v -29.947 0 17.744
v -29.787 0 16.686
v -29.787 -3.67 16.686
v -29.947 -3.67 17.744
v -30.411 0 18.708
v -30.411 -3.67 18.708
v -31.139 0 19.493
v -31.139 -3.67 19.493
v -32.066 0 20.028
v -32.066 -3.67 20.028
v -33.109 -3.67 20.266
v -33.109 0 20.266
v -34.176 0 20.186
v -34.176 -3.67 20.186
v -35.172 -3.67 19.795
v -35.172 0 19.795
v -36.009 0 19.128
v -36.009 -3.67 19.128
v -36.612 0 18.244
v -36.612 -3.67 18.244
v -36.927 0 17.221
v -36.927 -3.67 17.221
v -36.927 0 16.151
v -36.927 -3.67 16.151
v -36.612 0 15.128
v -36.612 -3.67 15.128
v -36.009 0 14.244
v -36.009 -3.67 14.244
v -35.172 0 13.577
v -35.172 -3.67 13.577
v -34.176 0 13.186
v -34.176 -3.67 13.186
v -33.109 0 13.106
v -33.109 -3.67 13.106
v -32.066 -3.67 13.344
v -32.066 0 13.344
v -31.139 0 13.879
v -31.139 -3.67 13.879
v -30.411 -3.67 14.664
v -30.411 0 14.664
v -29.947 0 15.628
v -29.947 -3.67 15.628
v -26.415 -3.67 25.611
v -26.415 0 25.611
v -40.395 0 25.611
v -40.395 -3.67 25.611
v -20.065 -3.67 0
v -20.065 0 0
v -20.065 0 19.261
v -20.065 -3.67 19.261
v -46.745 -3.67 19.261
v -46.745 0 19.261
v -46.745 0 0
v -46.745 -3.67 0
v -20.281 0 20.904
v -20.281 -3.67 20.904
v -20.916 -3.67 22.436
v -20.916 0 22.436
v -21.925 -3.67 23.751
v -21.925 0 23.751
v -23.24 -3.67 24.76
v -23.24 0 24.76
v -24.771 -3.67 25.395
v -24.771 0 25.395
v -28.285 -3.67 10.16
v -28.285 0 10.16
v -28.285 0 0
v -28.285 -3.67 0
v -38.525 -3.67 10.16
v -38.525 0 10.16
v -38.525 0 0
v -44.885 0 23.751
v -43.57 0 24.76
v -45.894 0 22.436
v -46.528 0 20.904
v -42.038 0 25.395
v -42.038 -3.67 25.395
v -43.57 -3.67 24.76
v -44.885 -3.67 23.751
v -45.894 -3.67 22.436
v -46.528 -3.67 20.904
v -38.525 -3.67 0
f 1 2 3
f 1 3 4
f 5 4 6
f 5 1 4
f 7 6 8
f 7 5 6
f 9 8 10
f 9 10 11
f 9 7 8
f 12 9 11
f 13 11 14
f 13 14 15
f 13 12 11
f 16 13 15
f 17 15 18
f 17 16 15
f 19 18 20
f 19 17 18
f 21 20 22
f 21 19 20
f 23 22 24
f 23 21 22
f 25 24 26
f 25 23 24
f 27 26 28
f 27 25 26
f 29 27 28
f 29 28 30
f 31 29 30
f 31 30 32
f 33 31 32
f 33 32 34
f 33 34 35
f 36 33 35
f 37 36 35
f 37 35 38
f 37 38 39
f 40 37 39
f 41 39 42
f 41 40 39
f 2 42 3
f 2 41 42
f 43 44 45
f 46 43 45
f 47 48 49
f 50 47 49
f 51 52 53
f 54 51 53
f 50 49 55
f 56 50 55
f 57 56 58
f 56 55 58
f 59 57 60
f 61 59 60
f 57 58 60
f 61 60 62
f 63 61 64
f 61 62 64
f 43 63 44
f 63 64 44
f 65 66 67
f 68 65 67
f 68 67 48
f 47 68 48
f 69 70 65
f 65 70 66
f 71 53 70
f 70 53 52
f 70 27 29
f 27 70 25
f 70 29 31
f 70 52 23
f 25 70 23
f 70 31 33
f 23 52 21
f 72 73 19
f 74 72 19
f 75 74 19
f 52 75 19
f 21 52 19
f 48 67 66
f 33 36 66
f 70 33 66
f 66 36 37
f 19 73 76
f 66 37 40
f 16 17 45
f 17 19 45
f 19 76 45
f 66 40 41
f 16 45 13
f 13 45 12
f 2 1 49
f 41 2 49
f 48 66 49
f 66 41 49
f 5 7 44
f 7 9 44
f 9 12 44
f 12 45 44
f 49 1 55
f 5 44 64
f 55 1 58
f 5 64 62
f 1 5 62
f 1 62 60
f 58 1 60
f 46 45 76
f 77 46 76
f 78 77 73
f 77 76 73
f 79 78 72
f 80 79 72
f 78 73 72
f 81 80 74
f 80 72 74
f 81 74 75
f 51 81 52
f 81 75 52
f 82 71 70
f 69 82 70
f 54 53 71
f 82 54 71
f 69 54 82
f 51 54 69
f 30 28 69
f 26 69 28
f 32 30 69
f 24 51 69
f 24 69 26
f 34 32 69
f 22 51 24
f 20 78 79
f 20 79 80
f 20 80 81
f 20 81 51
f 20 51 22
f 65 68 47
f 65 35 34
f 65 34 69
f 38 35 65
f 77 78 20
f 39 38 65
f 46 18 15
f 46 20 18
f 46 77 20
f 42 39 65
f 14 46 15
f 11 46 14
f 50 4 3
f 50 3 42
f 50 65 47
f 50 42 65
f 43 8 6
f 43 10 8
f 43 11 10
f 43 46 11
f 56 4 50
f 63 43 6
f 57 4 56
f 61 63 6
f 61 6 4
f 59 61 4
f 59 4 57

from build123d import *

# Parameters (mm, degrees)
F0_R     = 3.59
F1_DEPTH = 3.67
F3_DEPTH = 3.671
F4_W     = 6.9088
F4_H     = 18.185156
F4_W_2   = 6.909577
F5_DEPTH = 3.671


with BuildPart() as f1:
    # F0 (on Front) → F1 (new body)
    with BuildSketch(Plane.XZ):
        with BuildLine():
            Line((-46.744851, 19.260988), (-46.744851, 10.16))
            Line((-46.744851, 10.16), (-46.744851, 0))
            Line((-46.744851, 0), (-38.524851, 0))
            Line((-38.524851, 0), (-38.524851, 10.16))
            Line((-38.524851, 10.16), (-28.284851, 10.16))
            Line((-28.284851, 10.16), (-28.284851, 0))
            Line((-28.284851, 0), (-20.064851, 0))
            Line((-20.064851, 0), (-20.064851, 10.16))
            Line((-20.064851, 10.16), (-20.064851, 19.260988))
            ThreePointArc((-20.064851, 19.260988), (-21.924723, 23.751116), (-26.414851, 25.610988))
            Line((-26.414851, 25.610988), (-40.394851, 25.610988))
            ThreePointArc((-40.394851, 25.610988), (-44.884979, 23.751116), (-46.744851, 19.260988))
        make_face()
        with Locations((-33.377483, 16.686028)):
            Circle(F0_R, mode=Mode.SUBTRACT)
    extrude(amount=F1_DEPTH)

    # F2 (on face) → F3 (cut, through all)
    with BuildSketch(Plane.XZ.offset(3.67)):
        with BuildLine():
            ThreePointArc((-53.653651, 34.695156), (-51.793779, 30.205028), (-47.303651, 28.345156))
            Line((-47.303651, 28.345156), (-4.503874, 28.345156))
            Line((-4.503874, 28.345156), (-4.503874, 41.061975))
            Line((-4.503874, 41.061975), (-53.653651, 41.061975))
            Line((-53.653651, 41.061975), (-53.653651, 34.695156))
        make_face()
    extrude(amount=-F3_DEPTH, mode=Mode.SUBTRACT)

    # F4 (on face) → F5 (cut, through all)
    with BuildSketch(Plane.XZ.offset(3.67)):
        with Locations((-50.199251, 9.092578)):
            Rectangle(F4_W, F4_H)
        with Locations((-16.610062, 9.092578)):
            Rectangle(F4_W_2, F4_H)
    extrude(amount=-F5_DEPTH, mode=Mode.SUBTRACT)


solid = f1.part
